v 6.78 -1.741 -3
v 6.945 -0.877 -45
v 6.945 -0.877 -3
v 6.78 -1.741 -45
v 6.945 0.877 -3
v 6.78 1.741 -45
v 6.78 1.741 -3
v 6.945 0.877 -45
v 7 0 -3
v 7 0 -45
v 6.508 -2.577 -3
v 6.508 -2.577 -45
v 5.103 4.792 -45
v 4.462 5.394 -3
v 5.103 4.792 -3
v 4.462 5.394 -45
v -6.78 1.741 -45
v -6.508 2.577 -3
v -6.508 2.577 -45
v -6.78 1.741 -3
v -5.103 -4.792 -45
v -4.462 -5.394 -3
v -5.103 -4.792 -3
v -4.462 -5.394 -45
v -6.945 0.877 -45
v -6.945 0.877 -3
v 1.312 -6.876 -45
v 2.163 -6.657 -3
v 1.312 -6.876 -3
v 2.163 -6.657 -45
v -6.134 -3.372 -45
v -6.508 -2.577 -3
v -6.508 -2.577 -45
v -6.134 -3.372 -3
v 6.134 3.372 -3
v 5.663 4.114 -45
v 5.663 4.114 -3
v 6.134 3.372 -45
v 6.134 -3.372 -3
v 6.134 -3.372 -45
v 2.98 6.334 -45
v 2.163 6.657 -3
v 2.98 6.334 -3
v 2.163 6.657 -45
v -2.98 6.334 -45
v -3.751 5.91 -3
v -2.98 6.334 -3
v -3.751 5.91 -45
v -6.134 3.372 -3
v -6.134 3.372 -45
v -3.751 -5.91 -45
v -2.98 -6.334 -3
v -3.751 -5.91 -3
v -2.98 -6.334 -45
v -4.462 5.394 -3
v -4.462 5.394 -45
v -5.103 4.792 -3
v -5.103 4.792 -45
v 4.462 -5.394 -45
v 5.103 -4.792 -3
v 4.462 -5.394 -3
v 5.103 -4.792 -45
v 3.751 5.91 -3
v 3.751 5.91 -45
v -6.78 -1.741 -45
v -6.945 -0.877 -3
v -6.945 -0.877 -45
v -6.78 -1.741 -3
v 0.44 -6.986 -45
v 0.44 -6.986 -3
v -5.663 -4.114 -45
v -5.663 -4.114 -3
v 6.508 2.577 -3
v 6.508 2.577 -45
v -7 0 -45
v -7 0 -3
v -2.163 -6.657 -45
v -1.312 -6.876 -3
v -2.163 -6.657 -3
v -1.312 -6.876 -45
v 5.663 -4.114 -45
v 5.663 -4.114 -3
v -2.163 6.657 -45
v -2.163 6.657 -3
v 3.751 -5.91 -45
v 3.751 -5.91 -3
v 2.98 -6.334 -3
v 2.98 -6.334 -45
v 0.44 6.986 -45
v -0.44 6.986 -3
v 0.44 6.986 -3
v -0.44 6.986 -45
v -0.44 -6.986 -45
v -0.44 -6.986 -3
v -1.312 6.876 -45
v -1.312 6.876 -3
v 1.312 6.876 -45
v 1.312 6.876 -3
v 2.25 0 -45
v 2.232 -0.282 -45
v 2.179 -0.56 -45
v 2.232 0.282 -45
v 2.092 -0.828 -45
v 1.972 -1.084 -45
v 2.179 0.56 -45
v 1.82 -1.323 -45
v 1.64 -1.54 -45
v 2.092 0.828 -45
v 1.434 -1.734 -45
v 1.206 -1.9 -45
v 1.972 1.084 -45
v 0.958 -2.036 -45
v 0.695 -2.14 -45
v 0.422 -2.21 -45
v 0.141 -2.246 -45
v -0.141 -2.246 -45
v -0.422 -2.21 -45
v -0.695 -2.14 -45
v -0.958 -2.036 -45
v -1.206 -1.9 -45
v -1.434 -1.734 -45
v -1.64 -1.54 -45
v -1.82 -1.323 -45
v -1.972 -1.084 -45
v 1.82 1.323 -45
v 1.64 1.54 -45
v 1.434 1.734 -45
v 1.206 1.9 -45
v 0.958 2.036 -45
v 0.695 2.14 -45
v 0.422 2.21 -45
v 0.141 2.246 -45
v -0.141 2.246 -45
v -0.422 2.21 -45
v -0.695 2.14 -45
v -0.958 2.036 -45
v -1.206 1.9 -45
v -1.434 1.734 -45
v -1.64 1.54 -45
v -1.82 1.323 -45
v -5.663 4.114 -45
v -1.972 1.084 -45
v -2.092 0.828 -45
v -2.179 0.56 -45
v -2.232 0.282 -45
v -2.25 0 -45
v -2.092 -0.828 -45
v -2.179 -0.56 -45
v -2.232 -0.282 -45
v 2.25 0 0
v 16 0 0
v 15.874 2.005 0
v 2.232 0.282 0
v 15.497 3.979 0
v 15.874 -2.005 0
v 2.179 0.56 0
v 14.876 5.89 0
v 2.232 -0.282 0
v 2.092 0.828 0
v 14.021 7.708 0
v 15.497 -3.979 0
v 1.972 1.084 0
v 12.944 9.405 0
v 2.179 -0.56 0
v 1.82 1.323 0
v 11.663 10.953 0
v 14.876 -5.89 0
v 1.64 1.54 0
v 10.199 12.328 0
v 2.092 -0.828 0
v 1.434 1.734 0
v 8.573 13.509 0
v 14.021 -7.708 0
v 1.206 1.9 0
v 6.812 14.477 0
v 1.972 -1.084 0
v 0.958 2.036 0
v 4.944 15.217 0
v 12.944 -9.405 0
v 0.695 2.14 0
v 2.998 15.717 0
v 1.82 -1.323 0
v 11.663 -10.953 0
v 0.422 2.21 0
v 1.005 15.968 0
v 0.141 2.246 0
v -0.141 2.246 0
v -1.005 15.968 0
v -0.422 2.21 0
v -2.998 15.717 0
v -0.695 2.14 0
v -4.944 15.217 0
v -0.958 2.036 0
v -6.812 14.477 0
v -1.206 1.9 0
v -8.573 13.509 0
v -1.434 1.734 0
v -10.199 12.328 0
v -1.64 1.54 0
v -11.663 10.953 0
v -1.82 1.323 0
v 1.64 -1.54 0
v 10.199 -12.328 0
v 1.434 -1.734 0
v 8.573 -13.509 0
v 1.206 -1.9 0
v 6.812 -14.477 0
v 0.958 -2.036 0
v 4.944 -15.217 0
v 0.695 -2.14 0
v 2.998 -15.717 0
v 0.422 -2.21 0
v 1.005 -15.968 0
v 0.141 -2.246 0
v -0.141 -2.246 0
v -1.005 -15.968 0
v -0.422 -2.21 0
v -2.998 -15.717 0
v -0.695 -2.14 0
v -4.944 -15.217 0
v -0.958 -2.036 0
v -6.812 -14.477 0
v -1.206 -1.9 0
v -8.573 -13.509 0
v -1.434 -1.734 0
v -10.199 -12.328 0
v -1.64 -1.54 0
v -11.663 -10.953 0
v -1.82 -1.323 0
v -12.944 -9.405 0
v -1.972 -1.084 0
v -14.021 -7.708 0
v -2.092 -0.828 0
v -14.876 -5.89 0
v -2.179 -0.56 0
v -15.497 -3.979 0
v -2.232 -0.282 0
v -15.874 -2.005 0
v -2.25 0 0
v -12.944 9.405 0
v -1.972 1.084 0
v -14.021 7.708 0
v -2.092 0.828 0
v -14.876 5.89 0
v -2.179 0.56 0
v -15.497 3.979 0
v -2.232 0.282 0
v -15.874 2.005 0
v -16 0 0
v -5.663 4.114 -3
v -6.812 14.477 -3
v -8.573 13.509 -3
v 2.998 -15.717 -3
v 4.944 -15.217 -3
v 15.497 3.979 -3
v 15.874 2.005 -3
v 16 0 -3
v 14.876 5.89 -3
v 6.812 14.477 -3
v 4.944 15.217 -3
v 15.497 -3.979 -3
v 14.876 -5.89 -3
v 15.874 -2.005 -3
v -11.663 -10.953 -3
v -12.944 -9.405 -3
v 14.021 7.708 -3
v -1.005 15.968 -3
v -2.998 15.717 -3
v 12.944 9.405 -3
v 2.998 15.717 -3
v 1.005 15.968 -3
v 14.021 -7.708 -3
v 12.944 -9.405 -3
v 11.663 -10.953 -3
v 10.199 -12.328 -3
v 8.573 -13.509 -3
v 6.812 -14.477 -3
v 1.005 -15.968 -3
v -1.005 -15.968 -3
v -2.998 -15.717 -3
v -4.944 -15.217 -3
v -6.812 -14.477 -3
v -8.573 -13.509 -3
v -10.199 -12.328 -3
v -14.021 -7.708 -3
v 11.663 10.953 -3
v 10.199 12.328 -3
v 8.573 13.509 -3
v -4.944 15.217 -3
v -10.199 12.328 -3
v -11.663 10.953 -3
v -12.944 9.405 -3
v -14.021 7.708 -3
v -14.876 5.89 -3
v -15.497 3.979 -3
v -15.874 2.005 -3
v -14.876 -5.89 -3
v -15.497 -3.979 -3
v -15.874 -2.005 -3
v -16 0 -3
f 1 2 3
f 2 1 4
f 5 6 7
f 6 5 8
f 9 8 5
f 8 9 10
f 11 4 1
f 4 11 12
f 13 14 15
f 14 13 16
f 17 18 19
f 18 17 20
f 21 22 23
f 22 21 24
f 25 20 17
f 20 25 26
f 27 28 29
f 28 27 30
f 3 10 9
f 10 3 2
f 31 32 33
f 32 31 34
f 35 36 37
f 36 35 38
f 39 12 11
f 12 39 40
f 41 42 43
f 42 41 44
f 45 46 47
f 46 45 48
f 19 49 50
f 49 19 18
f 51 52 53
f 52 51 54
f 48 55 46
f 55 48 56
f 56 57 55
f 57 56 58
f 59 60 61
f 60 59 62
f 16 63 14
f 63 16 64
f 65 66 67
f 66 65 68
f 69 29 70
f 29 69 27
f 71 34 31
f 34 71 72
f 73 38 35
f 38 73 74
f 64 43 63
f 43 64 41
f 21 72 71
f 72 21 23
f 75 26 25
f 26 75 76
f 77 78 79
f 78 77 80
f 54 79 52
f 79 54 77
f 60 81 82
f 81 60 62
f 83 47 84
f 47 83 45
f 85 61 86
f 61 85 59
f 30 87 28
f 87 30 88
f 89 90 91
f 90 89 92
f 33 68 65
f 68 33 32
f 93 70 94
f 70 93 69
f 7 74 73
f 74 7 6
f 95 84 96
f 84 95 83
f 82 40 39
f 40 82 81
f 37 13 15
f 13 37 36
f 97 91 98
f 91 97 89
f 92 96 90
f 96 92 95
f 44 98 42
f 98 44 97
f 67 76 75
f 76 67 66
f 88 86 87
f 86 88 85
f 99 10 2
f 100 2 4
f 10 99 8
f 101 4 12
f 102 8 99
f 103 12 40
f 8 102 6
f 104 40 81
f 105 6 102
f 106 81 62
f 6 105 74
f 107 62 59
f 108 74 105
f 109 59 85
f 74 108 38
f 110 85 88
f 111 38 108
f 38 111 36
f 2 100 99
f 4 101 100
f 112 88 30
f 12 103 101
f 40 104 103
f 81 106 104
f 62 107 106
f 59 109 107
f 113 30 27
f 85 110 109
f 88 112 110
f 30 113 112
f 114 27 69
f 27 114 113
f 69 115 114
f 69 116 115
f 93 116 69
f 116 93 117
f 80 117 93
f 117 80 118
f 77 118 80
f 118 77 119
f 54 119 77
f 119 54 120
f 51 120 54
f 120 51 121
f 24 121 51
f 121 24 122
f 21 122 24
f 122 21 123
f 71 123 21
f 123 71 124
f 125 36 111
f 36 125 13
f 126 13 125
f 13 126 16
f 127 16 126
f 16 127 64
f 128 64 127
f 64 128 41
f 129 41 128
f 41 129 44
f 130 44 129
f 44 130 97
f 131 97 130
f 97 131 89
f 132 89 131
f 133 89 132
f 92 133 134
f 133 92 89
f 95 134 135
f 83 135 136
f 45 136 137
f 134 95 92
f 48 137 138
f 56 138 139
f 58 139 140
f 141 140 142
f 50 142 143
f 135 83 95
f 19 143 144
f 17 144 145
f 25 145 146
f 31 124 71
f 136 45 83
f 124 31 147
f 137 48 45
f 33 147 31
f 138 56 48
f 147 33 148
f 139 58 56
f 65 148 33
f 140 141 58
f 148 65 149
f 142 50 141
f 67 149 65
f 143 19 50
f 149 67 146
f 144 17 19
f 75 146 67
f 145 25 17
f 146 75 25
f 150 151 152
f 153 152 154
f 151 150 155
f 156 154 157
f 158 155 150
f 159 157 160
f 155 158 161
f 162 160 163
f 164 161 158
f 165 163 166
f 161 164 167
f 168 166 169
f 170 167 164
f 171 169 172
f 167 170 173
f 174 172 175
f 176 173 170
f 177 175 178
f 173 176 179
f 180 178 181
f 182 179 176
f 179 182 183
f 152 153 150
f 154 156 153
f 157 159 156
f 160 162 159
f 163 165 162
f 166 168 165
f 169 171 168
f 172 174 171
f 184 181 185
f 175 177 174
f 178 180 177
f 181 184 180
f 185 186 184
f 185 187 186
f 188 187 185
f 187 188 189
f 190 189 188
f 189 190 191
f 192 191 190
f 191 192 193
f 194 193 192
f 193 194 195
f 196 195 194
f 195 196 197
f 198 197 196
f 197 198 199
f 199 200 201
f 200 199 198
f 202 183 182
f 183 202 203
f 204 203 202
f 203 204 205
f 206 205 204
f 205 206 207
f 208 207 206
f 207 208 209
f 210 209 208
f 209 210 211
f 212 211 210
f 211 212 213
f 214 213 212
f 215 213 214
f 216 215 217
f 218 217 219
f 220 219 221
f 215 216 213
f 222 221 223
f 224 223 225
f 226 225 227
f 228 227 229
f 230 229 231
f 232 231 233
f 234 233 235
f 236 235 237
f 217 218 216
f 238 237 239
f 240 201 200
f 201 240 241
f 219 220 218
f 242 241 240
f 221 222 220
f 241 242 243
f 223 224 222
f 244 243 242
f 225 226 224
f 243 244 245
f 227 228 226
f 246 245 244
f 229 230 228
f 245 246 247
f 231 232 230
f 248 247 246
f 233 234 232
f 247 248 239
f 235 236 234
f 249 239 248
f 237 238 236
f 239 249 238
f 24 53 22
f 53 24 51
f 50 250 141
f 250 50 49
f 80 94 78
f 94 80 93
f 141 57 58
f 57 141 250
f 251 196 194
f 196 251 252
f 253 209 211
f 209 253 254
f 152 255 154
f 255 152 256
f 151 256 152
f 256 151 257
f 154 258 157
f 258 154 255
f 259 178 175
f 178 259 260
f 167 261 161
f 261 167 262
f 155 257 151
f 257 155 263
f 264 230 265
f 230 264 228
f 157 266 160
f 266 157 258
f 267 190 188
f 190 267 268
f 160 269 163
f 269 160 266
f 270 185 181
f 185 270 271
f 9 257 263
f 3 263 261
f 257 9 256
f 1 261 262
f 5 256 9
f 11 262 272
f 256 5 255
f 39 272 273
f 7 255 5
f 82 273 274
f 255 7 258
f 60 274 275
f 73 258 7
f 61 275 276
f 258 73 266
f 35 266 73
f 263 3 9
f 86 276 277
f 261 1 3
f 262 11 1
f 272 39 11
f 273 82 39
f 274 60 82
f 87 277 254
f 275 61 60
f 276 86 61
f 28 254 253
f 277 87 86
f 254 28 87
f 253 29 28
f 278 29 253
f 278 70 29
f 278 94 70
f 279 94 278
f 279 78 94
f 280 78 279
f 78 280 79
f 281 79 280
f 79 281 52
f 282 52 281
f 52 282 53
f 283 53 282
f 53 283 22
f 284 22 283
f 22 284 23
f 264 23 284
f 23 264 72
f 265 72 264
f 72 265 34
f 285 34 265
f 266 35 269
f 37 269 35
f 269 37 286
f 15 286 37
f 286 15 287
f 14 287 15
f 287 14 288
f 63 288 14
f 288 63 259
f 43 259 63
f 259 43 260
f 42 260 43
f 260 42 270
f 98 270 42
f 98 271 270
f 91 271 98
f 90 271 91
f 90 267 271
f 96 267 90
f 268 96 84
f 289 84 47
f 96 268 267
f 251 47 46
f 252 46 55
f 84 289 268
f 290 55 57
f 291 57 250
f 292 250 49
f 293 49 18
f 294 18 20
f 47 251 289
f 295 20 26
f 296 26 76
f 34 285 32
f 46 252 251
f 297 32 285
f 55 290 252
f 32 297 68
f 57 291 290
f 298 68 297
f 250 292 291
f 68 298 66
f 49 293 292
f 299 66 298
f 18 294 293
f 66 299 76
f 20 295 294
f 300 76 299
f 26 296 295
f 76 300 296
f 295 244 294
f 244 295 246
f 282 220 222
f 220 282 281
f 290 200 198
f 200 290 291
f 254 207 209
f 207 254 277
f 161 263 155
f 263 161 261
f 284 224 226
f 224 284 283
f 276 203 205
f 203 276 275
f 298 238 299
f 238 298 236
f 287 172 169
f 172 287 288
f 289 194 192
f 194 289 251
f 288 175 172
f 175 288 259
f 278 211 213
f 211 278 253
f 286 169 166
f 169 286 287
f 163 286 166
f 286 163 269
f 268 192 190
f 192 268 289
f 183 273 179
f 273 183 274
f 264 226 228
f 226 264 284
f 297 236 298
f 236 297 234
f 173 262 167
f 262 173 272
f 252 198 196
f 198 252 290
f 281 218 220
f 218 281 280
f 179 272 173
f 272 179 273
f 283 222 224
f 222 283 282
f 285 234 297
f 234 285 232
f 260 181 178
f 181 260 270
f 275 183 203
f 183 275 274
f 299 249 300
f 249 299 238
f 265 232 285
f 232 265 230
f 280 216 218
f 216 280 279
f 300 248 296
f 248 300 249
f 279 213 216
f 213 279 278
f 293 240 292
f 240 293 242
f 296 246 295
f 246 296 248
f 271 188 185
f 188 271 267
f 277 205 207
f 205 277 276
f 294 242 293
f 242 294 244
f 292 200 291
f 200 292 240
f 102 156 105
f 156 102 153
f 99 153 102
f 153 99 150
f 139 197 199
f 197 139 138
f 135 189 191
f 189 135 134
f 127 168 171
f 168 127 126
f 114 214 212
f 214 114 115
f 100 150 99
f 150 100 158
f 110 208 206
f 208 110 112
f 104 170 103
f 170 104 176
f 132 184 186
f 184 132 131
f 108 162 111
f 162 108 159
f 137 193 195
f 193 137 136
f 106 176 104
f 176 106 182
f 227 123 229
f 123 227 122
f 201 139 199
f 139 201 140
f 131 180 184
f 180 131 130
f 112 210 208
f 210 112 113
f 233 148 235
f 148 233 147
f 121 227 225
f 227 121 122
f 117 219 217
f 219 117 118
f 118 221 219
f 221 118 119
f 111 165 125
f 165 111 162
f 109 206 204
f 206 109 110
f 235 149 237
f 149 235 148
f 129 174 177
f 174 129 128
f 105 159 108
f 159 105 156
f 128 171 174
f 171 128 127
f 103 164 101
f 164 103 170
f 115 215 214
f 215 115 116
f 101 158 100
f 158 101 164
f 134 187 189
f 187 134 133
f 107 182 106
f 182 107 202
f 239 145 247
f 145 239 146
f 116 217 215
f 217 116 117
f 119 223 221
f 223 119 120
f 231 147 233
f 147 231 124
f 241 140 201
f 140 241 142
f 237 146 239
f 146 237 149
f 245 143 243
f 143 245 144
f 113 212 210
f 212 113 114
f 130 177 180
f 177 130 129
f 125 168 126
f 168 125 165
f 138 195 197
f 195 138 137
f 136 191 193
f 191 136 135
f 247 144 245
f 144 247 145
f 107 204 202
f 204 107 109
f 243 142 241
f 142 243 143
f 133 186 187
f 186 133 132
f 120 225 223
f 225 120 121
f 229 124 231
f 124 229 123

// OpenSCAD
$fn = 50;


difference() {
	union() {
		translate(v = [0, 0, -45.0000000000]) {
			cylinder(h = 45, r = 7.0000000000);
		}
		translate(v = [0, 0, -3.0000000000]) {
			cylinder(h = 3, r = 16.0000000000);
		}
	}
	union() {
		#translate(v = [0, 0, -45]) {
			cylinder(h = 45, r = 2.2500000000);
		}
	}
}
